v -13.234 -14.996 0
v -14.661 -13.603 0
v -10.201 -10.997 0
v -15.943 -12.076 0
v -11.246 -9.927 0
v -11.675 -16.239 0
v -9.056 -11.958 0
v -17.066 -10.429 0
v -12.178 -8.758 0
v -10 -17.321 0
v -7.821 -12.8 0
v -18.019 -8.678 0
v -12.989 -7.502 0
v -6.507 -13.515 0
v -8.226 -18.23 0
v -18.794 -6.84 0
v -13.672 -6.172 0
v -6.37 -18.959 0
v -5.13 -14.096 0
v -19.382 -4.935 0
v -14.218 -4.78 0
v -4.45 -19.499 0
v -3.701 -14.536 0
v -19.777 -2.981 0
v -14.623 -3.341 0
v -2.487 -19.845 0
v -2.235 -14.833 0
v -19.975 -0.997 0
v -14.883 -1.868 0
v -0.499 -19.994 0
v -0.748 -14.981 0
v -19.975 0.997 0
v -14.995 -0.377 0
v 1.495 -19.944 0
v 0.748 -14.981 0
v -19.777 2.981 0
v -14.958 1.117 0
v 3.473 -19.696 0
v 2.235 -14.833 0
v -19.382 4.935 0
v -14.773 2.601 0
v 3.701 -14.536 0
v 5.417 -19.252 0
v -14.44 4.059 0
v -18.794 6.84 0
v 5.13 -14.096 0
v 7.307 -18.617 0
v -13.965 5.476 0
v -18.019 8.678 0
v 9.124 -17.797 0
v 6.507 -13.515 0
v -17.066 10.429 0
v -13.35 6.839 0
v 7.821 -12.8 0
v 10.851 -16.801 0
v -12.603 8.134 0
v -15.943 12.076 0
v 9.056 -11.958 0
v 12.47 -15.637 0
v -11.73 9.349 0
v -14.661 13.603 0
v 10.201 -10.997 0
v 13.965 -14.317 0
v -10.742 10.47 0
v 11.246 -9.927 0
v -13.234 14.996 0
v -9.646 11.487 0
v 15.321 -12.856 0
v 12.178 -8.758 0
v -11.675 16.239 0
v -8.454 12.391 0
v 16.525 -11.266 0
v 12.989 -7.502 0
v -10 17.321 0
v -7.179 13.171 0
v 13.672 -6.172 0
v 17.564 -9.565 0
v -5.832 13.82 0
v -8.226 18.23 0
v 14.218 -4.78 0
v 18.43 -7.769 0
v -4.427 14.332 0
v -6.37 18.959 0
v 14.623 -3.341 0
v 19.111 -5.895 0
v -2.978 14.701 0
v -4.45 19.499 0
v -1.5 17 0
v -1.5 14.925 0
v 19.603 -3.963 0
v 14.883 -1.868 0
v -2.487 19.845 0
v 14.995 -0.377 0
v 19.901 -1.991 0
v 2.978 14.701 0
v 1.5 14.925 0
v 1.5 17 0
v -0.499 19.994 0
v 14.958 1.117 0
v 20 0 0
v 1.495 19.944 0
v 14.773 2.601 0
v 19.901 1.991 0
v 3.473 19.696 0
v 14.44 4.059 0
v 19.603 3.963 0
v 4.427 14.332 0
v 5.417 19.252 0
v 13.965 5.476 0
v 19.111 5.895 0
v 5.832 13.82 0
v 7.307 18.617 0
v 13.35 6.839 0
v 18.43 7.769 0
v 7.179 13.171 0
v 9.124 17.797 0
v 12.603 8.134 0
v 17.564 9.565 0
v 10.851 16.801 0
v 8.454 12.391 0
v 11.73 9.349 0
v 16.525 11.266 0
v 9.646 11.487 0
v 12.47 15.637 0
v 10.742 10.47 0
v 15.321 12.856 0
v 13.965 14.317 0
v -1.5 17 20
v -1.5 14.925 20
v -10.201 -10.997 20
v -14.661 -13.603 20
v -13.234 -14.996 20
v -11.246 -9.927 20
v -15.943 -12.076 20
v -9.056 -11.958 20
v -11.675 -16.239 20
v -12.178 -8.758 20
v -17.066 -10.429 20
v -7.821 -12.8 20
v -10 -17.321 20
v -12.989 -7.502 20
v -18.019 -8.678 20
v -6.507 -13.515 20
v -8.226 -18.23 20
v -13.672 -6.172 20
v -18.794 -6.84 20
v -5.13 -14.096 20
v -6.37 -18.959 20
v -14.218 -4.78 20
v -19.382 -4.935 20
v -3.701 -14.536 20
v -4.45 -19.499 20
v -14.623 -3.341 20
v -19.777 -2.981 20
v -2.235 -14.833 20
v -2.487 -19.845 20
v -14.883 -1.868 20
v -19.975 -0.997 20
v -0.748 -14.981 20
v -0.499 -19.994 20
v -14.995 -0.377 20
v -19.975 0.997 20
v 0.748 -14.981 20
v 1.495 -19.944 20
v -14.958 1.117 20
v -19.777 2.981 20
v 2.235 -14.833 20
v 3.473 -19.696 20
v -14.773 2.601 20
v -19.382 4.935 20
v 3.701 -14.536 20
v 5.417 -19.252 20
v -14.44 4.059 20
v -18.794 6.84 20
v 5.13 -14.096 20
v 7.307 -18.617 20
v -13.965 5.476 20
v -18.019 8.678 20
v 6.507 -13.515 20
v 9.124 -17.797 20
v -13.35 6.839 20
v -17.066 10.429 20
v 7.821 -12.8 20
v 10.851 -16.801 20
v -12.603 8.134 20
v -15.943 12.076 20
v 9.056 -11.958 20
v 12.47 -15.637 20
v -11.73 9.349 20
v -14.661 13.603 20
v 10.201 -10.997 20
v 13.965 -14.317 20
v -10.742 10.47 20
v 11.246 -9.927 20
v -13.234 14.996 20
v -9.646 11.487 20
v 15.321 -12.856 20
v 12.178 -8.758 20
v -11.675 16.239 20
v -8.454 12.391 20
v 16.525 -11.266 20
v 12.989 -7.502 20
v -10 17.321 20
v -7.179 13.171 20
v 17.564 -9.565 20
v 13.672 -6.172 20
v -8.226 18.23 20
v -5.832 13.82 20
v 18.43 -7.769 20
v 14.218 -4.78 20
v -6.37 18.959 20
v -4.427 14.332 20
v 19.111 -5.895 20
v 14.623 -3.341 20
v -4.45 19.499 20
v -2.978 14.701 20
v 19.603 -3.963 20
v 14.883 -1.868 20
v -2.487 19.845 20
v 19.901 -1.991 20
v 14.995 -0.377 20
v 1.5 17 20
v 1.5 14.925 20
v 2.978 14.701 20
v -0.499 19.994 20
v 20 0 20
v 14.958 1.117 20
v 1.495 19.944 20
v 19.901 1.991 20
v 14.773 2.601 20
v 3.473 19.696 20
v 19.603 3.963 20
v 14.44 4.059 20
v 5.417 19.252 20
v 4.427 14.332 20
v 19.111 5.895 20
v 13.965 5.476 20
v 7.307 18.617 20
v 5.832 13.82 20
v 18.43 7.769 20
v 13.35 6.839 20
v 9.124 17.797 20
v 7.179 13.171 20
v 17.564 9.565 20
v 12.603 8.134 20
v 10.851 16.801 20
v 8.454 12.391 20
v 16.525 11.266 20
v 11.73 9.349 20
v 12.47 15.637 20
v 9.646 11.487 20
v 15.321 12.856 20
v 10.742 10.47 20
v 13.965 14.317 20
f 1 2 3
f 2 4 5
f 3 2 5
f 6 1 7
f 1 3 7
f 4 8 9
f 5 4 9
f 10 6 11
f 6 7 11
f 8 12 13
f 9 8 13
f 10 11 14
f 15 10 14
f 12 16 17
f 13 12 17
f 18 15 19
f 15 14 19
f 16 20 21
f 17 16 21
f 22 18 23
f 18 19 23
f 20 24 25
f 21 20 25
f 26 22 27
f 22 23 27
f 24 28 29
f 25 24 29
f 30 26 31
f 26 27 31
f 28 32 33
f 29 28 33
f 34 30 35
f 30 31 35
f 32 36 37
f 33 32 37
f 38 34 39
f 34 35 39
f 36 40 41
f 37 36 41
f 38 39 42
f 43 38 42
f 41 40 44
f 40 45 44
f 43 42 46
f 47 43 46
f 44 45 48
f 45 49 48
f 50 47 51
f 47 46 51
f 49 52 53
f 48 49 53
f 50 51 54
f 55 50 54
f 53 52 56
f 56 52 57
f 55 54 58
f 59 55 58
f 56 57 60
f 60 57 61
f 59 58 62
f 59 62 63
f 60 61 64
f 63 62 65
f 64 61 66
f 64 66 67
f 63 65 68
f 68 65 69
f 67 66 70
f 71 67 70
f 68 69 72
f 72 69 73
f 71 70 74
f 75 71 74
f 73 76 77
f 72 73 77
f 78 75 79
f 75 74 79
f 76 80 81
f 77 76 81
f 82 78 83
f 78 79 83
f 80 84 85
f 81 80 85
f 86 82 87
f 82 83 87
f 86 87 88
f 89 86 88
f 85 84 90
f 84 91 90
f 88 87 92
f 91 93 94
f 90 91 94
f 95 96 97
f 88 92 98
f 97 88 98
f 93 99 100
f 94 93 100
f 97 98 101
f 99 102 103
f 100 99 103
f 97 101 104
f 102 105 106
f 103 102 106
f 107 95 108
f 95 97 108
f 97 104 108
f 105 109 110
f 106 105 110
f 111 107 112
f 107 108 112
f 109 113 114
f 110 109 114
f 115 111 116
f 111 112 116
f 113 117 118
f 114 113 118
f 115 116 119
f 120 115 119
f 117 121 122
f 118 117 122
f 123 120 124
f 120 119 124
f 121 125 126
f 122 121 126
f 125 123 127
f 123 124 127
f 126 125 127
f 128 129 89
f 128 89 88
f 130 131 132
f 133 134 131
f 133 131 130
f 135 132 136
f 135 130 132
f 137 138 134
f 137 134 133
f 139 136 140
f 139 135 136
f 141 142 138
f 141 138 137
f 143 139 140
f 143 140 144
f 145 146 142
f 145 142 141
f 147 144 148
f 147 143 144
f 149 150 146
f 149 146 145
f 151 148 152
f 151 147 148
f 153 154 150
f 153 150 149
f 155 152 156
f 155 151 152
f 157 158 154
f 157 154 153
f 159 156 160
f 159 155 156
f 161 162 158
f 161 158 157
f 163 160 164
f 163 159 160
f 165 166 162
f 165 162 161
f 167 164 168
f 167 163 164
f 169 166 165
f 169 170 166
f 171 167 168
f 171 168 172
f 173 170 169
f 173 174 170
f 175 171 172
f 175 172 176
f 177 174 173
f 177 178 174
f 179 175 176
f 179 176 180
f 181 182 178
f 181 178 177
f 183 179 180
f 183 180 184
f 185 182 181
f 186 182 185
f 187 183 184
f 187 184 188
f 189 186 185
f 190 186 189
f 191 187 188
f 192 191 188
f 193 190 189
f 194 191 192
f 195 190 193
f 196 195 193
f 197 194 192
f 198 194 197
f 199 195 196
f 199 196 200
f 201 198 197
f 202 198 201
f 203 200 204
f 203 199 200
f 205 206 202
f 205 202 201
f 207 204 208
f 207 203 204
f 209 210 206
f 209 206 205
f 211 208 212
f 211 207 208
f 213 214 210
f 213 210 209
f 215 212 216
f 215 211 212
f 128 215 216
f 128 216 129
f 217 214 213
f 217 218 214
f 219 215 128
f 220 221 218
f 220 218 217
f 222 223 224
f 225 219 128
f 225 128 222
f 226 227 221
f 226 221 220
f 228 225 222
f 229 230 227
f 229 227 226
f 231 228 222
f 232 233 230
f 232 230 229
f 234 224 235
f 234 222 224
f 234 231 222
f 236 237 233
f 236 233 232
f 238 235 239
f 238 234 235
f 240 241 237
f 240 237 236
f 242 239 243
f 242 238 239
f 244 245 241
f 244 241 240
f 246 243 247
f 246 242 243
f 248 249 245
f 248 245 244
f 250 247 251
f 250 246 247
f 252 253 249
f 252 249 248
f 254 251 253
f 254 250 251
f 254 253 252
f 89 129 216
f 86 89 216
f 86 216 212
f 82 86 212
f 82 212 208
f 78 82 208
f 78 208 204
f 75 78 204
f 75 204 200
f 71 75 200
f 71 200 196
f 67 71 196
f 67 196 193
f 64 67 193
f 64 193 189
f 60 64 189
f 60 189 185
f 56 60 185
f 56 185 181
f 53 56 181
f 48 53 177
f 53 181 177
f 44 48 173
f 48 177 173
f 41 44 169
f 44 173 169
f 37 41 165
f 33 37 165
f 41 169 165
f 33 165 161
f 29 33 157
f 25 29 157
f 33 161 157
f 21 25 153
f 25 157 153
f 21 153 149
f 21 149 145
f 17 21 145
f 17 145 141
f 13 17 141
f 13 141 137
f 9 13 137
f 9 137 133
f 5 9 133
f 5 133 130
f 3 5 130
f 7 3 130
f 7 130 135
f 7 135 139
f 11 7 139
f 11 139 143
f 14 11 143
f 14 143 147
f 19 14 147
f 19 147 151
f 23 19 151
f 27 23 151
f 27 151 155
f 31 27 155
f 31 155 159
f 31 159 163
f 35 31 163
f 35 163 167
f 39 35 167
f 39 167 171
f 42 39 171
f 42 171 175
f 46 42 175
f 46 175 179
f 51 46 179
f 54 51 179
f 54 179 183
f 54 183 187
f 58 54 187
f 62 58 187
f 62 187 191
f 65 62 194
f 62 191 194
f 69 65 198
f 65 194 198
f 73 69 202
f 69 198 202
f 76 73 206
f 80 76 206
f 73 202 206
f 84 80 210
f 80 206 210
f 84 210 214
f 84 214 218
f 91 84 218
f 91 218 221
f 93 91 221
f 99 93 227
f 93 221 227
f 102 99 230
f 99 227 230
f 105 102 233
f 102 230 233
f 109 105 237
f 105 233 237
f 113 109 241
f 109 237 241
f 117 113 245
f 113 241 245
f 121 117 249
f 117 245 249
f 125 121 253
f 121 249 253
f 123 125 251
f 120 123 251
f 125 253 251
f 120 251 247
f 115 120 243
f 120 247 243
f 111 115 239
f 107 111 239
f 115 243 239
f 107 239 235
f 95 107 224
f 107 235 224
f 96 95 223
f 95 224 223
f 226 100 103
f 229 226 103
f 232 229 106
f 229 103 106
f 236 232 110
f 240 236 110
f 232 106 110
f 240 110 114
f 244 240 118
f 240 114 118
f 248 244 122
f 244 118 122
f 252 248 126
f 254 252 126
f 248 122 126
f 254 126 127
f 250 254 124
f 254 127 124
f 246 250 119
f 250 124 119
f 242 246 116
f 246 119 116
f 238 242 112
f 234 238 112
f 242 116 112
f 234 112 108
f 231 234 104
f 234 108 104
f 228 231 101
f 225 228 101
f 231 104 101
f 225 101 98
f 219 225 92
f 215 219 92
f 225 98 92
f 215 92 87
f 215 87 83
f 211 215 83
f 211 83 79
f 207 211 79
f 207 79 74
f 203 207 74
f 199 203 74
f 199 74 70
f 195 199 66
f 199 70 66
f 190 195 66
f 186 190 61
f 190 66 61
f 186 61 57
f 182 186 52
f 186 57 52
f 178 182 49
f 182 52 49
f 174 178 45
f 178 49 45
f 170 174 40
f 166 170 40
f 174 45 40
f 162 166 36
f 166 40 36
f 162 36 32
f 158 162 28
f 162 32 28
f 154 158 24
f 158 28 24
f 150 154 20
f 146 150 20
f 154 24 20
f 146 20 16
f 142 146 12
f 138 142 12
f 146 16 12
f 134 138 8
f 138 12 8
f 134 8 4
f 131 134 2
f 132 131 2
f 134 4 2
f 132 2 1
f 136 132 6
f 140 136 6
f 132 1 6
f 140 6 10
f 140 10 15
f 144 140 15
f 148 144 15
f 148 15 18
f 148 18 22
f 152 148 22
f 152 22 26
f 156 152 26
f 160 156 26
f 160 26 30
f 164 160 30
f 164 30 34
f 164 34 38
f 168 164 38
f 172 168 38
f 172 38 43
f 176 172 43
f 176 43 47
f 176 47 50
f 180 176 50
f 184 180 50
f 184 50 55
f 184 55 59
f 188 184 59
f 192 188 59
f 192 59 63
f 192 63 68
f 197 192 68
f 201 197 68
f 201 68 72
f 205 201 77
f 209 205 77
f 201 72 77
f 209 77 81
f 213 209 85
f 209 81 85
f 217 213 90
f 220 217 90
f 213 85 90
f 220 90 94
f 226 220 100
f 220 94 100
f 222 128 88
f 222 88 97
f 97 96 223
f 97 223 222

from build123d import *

# Parameters (mm, degrees)
SKETCH_1_R          = 20
EXTRUDE_1_DEPTH     = 20
SKETCH_2_R          = 15
SKETCH_2_W          = 3
SKETCH_2_H          = 17
CUT_EXTRUDE_1_DEPTH = 35.641016151


with BuildPart() as part:
    # 草图1 → 凸台-拉伸1 (new body)
    with BuildSketch(Plane.XY):
        Circle(SKETCH_1_R)
    extrude(amount=EXTRUDE_1_DEPTH)

    # 草图2 → 切除-拉伸1 (cut, through all)
    with BuildSketch(Plane.XY.offset(20)):
        Circle(SKETCH_2_R)
        with Locations((0, 8.5)):
            Rectangle(SKETCH_2_W, SKETCH_2_H)
    extrude(amount=-CUT_EXTRUDE_1_DEPTH, mode=Mode.SUBTRACT)


solid = part.part
